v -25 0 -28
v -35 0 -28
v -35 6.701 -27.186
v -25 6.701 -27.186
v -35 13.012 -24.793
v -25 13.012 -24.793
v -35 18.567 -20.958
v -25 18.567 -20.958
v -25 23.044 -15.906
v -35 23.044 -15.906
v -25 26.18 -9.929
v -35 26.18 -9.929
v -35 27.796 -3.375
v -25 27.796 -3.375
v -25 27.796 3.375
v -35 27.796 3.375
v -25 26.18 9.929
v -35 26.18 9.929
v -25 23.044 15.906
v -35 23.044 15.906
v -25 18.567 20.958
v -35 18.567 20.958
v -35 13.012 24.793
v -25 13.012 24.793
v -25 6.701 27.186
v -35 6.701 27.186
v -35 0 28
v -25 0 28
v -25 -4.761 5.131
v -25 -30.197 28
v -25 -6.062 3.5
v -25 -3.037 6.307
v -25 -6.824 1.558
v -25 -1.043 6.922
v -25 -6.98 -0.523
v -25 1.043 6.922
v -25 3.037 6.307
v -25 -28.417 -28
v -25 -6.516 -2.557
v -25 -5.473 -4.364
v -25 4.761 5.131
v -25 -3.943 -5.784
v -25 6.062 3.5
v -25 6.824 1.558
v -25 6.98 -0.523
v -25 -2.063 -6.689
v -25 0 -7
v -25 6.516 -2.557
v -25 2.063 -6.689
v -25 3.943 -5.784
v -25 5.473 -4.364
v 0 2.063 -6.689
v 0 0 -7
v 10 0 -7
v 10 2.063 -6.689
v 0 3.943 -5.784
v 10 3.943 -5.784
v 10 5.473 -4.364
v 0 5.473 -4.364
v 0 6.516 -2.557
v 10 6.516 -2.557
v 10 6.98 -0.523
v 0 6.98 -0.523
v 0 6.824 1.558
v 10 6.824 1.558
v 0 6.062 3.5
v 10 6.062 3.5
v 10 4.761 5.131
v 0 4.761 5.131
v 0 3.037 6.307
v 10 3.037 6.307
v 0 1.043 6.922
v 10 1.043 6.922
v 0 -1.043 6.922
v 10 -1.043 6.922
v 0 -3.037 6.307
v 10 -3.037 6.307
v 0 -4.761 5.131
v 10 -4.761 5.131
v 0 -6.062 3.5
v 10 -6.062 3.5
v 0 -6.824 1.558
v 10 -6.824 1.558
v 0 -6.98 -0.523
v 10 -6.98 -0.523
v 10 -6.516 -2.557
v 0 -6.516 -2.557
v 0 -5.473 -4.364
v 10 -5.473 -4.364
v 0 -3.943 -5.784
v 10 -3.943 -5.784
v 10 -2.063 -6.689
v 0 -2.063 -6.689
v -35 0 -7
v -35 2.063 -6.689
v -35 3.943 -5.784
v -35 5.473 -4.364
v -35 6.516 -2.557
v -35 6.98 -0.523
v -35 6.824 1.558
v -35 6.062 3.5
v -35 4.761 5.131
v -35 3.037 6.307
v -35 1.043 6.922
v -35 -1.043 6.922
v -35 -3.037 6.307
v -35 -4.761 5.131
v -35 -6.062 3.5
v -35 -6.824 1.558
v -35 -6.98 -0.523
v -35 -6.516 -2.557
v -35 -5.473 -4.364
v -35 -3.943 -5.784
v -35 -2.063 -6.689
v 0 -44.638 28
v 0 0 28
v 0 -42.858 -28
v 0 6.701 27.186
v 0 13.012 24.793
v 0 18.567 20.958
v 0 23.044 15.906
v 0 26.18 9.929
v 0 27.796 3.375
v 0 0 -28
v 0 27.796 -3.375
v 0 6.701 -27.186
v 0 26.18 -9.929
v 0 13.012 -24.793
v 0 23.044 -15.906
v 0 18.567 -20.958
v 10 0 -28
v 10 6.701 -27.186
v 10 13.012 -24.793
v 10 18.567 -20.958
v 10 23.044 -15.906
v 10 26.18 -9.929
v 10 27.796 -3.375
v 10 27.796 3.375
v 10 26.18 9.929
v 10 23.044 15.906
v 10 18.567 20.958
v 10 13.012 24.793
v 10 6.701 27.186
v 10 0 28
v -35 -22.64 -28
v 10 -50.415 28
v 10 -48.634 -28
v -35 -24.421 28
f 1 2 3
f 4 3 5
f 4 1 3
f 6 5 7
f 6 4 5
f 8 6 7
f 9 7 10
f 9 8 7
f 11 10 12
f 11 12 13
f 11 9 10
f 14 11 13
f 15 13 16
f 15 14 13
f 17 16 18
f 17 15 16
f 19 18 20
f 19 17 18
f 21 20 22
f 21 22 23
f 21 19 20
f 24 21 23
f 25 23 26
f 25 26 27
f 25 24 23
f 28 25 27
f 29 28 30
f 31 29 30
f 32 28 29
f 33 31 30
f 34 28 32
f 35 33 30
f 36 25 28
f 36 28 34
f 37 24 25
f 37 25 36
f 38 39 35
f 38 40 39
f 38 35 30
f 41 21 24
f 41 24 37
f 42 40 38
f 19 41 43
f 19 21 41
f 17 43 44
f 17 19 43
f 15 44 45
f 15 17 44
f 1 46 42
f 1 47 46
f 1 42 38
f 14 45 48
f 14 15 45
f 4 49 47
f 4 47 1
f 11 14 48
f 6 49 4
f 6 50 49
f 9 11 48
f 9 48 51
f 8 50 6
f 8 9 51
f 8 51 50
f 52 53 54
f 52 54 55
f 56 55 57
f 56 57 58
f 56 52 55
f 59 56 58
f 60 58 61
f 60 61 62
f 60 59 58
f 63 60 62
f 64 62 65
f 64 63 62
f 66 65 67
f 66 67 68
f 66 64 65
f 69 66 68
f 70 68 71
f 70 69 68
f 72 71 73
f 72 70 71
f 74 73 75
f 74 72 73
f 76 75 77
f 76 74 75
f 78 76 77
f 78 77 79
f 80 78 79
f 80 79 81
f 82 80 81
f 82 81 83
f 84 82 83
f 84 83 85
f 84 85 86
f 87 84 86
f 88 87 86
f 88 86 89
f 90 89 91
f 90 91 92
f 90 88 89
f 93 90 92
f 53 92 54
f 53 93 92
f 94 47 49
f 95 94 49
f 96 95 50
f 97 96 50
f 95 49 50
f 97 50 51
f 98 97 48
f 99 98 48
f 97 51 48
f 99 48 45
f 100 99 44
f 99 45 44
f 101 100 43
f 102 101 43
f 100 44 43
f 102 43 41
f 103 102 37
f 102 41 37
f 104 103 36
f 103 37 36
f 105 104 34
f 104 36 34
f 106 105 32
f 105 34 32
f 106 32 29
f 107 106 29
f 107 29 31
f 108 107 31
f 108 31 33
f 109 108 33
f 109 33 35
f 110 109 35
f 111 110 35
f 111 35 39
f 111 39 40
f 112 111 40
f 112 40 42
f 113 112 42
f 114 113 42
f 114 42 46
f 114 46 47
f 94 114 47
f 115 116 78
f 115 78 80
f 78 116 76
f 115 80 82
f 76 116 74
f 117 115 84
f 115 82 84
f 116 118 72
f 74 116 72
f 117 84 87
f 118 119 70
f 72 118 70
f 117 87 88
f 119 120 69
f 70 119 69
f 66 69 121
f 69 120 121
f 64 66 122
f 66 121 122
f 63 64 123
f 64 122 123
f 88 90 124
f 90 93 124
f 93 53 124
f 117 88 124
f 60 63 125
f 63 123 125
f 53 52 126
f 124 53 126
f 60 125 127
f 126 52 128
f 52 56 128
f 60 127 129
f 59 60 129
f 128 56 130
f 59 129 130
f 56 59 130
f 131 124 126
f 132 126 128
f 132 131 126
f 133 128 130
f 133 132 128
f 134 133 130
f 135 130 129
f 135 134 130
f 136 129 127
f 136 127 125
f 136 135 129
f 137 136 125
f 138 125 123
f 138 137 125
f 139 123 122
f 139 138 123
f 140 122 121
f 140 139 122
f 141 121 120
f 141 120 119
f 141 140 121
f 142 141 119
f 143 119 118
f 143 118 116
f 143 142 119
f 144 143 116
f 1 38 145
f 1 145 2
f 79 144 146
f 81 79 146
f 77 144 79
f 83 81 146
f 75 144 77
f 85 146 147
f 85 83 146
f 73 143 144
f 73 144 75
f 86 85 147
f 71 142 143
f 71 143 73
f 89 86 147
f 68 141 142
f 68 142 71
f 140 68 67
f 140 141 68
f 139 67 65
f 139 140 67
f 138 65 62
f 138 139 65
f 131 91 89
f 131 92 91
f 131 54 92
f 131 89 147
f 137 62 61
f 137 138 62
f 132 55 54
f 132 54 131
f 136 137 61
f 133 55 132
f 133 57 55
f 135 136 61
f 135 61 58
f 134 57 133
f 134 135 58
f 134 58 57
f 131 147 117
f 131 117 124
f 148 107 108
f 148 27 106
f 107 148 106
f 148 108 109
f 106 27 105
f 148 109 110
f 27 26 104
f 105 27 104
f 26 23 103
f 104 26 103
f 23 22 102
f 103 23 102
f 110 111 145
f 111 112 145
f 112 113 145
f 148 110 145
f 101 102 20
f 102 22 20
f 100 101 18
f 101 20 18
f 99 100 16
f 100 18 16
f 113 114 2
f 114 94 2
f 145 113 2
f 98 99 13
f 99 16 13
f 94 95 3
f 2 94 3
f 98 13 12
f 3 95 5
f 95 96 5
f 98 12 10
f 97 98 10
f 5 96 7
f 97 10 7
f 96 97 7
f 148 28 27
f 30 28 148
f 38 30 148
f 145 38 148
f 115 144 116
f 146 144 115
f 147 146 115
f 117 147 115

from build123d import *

# Parameters (mm, degrees)
EXTRUDE_1_DEPTH      = 10
EXTRUDE_1_DEPTH_BACK = 35
SKETCH_1_R           = 7
CUT_EXTRUDE_START    = -25
SKETCH_1_2_R         = 7
CUT_EXTRUDE_1_DEPTH  = 25
SKETCH_2_R           = 145.556166069
CUT_EXTRUDE_5_DEPTH  = 168


with BuildPart() as part:
    # 草图1 → 凸台-拉伸1 (new, two sides: drawn at the far end of the back side and taken through both)
    with BuildSketch(Plane(origin=(0, 0, 0), x_dir=(0, 0, -1), z_dir=(1, 0, 0)).offset(-EXTRUDE_1_DEPTH_BACK)):
        with BuildLine():
            Line((-28, 0), (-28, -100))
            Line((-28, -100), (28, -100))
            Line((28, -100), (28, 0))
            ThreePointArc((28, 0), (0, 28), (-28, 0))
        make_face()
        Circle(SKETCH_1_R, mode=Mode.SUBTRACT)
    extrude(amount=EXTRUDE_1_DEPTH + EXTRUDE_1_DEPTH_BACK)

    # 草图1<2> → 切除-拉伸1 (cut)
    with BuildSketch(Plane(origin=(0, 0, 0), x_dir=(0, 0, -1), z_dir=(1, 0, 0)).offset(CUT_EXTRUDE_START)):
        with BuildLine():
            Line((-28, 0), (-28, -100))
            Line((-28, -100), (28, -100))
            Line((28, -100), (28, 0))
            ThreePointArc((28, 0), (0, 28), (-28, 0))
        make_face()
        Circle(SKETCH_1_2_R, mode=Mode.SUBTRACT)
    extrude(amount=CUT_EXTRUDE_1_DEPTH, mode=Mode.SUBTRACT)


with BuildPart() as cut_extrude_1_piece_1:
    # of the separate pieces the step leaves, piece 1, a body of its own (cut_extrude_1_pieces)
    add(part.part.solids().sort_by_distance((10, 0, 28))[0])


with BuildPart() as cut_extrude_1_piece_2:
    # of the separate pieces the step leaves, piece 2, a body of its own (cut_extrude_1_pieces)
    add(part.part.solids().sort_by_distance((-25, 0, 28))[0])


with BuildPart() as cut_extrude_5_tool:
    # 草图2 → 切除-拉伸5 (new body)
    with BuildSketch(Plane(origin=(-18.933890419, -32.777900255, -1.04205282), x_dir=(-0.7521898804506026, 0.41831008991821805, 0.5091434497470438), z_dir=(0.49999999999999845, 0.8655880944028659, 0.027518190856543806))):
        Circle(SKETCH_2_R)
    extrude(amount=-CUT_EXTRUDE_5_DEPTH)


with BuildPart() as cut_extrude_1_piece_1_1:
    add(cut_extrude_1_piece_1.part)

    # 切除-拉伸5: cut by cut_extrude_5_tool
    add(cut_extrude_5_tool.part, mode=Mode.SUBTRACT)


with BuildPart() as cut_extrude_1_piece_2_1:
    add(cut_extrude_1_piece_2.part)

    # 切除-拉伸5: cut by cut_extrude_5_tool
    add(cut_extrude_5_tool.part, mode=Mode.SUBTRACT)


solid = Compound([cut_extrude_1_piece_1_1.part, cut_extrude_1_piece_2_1.part])
